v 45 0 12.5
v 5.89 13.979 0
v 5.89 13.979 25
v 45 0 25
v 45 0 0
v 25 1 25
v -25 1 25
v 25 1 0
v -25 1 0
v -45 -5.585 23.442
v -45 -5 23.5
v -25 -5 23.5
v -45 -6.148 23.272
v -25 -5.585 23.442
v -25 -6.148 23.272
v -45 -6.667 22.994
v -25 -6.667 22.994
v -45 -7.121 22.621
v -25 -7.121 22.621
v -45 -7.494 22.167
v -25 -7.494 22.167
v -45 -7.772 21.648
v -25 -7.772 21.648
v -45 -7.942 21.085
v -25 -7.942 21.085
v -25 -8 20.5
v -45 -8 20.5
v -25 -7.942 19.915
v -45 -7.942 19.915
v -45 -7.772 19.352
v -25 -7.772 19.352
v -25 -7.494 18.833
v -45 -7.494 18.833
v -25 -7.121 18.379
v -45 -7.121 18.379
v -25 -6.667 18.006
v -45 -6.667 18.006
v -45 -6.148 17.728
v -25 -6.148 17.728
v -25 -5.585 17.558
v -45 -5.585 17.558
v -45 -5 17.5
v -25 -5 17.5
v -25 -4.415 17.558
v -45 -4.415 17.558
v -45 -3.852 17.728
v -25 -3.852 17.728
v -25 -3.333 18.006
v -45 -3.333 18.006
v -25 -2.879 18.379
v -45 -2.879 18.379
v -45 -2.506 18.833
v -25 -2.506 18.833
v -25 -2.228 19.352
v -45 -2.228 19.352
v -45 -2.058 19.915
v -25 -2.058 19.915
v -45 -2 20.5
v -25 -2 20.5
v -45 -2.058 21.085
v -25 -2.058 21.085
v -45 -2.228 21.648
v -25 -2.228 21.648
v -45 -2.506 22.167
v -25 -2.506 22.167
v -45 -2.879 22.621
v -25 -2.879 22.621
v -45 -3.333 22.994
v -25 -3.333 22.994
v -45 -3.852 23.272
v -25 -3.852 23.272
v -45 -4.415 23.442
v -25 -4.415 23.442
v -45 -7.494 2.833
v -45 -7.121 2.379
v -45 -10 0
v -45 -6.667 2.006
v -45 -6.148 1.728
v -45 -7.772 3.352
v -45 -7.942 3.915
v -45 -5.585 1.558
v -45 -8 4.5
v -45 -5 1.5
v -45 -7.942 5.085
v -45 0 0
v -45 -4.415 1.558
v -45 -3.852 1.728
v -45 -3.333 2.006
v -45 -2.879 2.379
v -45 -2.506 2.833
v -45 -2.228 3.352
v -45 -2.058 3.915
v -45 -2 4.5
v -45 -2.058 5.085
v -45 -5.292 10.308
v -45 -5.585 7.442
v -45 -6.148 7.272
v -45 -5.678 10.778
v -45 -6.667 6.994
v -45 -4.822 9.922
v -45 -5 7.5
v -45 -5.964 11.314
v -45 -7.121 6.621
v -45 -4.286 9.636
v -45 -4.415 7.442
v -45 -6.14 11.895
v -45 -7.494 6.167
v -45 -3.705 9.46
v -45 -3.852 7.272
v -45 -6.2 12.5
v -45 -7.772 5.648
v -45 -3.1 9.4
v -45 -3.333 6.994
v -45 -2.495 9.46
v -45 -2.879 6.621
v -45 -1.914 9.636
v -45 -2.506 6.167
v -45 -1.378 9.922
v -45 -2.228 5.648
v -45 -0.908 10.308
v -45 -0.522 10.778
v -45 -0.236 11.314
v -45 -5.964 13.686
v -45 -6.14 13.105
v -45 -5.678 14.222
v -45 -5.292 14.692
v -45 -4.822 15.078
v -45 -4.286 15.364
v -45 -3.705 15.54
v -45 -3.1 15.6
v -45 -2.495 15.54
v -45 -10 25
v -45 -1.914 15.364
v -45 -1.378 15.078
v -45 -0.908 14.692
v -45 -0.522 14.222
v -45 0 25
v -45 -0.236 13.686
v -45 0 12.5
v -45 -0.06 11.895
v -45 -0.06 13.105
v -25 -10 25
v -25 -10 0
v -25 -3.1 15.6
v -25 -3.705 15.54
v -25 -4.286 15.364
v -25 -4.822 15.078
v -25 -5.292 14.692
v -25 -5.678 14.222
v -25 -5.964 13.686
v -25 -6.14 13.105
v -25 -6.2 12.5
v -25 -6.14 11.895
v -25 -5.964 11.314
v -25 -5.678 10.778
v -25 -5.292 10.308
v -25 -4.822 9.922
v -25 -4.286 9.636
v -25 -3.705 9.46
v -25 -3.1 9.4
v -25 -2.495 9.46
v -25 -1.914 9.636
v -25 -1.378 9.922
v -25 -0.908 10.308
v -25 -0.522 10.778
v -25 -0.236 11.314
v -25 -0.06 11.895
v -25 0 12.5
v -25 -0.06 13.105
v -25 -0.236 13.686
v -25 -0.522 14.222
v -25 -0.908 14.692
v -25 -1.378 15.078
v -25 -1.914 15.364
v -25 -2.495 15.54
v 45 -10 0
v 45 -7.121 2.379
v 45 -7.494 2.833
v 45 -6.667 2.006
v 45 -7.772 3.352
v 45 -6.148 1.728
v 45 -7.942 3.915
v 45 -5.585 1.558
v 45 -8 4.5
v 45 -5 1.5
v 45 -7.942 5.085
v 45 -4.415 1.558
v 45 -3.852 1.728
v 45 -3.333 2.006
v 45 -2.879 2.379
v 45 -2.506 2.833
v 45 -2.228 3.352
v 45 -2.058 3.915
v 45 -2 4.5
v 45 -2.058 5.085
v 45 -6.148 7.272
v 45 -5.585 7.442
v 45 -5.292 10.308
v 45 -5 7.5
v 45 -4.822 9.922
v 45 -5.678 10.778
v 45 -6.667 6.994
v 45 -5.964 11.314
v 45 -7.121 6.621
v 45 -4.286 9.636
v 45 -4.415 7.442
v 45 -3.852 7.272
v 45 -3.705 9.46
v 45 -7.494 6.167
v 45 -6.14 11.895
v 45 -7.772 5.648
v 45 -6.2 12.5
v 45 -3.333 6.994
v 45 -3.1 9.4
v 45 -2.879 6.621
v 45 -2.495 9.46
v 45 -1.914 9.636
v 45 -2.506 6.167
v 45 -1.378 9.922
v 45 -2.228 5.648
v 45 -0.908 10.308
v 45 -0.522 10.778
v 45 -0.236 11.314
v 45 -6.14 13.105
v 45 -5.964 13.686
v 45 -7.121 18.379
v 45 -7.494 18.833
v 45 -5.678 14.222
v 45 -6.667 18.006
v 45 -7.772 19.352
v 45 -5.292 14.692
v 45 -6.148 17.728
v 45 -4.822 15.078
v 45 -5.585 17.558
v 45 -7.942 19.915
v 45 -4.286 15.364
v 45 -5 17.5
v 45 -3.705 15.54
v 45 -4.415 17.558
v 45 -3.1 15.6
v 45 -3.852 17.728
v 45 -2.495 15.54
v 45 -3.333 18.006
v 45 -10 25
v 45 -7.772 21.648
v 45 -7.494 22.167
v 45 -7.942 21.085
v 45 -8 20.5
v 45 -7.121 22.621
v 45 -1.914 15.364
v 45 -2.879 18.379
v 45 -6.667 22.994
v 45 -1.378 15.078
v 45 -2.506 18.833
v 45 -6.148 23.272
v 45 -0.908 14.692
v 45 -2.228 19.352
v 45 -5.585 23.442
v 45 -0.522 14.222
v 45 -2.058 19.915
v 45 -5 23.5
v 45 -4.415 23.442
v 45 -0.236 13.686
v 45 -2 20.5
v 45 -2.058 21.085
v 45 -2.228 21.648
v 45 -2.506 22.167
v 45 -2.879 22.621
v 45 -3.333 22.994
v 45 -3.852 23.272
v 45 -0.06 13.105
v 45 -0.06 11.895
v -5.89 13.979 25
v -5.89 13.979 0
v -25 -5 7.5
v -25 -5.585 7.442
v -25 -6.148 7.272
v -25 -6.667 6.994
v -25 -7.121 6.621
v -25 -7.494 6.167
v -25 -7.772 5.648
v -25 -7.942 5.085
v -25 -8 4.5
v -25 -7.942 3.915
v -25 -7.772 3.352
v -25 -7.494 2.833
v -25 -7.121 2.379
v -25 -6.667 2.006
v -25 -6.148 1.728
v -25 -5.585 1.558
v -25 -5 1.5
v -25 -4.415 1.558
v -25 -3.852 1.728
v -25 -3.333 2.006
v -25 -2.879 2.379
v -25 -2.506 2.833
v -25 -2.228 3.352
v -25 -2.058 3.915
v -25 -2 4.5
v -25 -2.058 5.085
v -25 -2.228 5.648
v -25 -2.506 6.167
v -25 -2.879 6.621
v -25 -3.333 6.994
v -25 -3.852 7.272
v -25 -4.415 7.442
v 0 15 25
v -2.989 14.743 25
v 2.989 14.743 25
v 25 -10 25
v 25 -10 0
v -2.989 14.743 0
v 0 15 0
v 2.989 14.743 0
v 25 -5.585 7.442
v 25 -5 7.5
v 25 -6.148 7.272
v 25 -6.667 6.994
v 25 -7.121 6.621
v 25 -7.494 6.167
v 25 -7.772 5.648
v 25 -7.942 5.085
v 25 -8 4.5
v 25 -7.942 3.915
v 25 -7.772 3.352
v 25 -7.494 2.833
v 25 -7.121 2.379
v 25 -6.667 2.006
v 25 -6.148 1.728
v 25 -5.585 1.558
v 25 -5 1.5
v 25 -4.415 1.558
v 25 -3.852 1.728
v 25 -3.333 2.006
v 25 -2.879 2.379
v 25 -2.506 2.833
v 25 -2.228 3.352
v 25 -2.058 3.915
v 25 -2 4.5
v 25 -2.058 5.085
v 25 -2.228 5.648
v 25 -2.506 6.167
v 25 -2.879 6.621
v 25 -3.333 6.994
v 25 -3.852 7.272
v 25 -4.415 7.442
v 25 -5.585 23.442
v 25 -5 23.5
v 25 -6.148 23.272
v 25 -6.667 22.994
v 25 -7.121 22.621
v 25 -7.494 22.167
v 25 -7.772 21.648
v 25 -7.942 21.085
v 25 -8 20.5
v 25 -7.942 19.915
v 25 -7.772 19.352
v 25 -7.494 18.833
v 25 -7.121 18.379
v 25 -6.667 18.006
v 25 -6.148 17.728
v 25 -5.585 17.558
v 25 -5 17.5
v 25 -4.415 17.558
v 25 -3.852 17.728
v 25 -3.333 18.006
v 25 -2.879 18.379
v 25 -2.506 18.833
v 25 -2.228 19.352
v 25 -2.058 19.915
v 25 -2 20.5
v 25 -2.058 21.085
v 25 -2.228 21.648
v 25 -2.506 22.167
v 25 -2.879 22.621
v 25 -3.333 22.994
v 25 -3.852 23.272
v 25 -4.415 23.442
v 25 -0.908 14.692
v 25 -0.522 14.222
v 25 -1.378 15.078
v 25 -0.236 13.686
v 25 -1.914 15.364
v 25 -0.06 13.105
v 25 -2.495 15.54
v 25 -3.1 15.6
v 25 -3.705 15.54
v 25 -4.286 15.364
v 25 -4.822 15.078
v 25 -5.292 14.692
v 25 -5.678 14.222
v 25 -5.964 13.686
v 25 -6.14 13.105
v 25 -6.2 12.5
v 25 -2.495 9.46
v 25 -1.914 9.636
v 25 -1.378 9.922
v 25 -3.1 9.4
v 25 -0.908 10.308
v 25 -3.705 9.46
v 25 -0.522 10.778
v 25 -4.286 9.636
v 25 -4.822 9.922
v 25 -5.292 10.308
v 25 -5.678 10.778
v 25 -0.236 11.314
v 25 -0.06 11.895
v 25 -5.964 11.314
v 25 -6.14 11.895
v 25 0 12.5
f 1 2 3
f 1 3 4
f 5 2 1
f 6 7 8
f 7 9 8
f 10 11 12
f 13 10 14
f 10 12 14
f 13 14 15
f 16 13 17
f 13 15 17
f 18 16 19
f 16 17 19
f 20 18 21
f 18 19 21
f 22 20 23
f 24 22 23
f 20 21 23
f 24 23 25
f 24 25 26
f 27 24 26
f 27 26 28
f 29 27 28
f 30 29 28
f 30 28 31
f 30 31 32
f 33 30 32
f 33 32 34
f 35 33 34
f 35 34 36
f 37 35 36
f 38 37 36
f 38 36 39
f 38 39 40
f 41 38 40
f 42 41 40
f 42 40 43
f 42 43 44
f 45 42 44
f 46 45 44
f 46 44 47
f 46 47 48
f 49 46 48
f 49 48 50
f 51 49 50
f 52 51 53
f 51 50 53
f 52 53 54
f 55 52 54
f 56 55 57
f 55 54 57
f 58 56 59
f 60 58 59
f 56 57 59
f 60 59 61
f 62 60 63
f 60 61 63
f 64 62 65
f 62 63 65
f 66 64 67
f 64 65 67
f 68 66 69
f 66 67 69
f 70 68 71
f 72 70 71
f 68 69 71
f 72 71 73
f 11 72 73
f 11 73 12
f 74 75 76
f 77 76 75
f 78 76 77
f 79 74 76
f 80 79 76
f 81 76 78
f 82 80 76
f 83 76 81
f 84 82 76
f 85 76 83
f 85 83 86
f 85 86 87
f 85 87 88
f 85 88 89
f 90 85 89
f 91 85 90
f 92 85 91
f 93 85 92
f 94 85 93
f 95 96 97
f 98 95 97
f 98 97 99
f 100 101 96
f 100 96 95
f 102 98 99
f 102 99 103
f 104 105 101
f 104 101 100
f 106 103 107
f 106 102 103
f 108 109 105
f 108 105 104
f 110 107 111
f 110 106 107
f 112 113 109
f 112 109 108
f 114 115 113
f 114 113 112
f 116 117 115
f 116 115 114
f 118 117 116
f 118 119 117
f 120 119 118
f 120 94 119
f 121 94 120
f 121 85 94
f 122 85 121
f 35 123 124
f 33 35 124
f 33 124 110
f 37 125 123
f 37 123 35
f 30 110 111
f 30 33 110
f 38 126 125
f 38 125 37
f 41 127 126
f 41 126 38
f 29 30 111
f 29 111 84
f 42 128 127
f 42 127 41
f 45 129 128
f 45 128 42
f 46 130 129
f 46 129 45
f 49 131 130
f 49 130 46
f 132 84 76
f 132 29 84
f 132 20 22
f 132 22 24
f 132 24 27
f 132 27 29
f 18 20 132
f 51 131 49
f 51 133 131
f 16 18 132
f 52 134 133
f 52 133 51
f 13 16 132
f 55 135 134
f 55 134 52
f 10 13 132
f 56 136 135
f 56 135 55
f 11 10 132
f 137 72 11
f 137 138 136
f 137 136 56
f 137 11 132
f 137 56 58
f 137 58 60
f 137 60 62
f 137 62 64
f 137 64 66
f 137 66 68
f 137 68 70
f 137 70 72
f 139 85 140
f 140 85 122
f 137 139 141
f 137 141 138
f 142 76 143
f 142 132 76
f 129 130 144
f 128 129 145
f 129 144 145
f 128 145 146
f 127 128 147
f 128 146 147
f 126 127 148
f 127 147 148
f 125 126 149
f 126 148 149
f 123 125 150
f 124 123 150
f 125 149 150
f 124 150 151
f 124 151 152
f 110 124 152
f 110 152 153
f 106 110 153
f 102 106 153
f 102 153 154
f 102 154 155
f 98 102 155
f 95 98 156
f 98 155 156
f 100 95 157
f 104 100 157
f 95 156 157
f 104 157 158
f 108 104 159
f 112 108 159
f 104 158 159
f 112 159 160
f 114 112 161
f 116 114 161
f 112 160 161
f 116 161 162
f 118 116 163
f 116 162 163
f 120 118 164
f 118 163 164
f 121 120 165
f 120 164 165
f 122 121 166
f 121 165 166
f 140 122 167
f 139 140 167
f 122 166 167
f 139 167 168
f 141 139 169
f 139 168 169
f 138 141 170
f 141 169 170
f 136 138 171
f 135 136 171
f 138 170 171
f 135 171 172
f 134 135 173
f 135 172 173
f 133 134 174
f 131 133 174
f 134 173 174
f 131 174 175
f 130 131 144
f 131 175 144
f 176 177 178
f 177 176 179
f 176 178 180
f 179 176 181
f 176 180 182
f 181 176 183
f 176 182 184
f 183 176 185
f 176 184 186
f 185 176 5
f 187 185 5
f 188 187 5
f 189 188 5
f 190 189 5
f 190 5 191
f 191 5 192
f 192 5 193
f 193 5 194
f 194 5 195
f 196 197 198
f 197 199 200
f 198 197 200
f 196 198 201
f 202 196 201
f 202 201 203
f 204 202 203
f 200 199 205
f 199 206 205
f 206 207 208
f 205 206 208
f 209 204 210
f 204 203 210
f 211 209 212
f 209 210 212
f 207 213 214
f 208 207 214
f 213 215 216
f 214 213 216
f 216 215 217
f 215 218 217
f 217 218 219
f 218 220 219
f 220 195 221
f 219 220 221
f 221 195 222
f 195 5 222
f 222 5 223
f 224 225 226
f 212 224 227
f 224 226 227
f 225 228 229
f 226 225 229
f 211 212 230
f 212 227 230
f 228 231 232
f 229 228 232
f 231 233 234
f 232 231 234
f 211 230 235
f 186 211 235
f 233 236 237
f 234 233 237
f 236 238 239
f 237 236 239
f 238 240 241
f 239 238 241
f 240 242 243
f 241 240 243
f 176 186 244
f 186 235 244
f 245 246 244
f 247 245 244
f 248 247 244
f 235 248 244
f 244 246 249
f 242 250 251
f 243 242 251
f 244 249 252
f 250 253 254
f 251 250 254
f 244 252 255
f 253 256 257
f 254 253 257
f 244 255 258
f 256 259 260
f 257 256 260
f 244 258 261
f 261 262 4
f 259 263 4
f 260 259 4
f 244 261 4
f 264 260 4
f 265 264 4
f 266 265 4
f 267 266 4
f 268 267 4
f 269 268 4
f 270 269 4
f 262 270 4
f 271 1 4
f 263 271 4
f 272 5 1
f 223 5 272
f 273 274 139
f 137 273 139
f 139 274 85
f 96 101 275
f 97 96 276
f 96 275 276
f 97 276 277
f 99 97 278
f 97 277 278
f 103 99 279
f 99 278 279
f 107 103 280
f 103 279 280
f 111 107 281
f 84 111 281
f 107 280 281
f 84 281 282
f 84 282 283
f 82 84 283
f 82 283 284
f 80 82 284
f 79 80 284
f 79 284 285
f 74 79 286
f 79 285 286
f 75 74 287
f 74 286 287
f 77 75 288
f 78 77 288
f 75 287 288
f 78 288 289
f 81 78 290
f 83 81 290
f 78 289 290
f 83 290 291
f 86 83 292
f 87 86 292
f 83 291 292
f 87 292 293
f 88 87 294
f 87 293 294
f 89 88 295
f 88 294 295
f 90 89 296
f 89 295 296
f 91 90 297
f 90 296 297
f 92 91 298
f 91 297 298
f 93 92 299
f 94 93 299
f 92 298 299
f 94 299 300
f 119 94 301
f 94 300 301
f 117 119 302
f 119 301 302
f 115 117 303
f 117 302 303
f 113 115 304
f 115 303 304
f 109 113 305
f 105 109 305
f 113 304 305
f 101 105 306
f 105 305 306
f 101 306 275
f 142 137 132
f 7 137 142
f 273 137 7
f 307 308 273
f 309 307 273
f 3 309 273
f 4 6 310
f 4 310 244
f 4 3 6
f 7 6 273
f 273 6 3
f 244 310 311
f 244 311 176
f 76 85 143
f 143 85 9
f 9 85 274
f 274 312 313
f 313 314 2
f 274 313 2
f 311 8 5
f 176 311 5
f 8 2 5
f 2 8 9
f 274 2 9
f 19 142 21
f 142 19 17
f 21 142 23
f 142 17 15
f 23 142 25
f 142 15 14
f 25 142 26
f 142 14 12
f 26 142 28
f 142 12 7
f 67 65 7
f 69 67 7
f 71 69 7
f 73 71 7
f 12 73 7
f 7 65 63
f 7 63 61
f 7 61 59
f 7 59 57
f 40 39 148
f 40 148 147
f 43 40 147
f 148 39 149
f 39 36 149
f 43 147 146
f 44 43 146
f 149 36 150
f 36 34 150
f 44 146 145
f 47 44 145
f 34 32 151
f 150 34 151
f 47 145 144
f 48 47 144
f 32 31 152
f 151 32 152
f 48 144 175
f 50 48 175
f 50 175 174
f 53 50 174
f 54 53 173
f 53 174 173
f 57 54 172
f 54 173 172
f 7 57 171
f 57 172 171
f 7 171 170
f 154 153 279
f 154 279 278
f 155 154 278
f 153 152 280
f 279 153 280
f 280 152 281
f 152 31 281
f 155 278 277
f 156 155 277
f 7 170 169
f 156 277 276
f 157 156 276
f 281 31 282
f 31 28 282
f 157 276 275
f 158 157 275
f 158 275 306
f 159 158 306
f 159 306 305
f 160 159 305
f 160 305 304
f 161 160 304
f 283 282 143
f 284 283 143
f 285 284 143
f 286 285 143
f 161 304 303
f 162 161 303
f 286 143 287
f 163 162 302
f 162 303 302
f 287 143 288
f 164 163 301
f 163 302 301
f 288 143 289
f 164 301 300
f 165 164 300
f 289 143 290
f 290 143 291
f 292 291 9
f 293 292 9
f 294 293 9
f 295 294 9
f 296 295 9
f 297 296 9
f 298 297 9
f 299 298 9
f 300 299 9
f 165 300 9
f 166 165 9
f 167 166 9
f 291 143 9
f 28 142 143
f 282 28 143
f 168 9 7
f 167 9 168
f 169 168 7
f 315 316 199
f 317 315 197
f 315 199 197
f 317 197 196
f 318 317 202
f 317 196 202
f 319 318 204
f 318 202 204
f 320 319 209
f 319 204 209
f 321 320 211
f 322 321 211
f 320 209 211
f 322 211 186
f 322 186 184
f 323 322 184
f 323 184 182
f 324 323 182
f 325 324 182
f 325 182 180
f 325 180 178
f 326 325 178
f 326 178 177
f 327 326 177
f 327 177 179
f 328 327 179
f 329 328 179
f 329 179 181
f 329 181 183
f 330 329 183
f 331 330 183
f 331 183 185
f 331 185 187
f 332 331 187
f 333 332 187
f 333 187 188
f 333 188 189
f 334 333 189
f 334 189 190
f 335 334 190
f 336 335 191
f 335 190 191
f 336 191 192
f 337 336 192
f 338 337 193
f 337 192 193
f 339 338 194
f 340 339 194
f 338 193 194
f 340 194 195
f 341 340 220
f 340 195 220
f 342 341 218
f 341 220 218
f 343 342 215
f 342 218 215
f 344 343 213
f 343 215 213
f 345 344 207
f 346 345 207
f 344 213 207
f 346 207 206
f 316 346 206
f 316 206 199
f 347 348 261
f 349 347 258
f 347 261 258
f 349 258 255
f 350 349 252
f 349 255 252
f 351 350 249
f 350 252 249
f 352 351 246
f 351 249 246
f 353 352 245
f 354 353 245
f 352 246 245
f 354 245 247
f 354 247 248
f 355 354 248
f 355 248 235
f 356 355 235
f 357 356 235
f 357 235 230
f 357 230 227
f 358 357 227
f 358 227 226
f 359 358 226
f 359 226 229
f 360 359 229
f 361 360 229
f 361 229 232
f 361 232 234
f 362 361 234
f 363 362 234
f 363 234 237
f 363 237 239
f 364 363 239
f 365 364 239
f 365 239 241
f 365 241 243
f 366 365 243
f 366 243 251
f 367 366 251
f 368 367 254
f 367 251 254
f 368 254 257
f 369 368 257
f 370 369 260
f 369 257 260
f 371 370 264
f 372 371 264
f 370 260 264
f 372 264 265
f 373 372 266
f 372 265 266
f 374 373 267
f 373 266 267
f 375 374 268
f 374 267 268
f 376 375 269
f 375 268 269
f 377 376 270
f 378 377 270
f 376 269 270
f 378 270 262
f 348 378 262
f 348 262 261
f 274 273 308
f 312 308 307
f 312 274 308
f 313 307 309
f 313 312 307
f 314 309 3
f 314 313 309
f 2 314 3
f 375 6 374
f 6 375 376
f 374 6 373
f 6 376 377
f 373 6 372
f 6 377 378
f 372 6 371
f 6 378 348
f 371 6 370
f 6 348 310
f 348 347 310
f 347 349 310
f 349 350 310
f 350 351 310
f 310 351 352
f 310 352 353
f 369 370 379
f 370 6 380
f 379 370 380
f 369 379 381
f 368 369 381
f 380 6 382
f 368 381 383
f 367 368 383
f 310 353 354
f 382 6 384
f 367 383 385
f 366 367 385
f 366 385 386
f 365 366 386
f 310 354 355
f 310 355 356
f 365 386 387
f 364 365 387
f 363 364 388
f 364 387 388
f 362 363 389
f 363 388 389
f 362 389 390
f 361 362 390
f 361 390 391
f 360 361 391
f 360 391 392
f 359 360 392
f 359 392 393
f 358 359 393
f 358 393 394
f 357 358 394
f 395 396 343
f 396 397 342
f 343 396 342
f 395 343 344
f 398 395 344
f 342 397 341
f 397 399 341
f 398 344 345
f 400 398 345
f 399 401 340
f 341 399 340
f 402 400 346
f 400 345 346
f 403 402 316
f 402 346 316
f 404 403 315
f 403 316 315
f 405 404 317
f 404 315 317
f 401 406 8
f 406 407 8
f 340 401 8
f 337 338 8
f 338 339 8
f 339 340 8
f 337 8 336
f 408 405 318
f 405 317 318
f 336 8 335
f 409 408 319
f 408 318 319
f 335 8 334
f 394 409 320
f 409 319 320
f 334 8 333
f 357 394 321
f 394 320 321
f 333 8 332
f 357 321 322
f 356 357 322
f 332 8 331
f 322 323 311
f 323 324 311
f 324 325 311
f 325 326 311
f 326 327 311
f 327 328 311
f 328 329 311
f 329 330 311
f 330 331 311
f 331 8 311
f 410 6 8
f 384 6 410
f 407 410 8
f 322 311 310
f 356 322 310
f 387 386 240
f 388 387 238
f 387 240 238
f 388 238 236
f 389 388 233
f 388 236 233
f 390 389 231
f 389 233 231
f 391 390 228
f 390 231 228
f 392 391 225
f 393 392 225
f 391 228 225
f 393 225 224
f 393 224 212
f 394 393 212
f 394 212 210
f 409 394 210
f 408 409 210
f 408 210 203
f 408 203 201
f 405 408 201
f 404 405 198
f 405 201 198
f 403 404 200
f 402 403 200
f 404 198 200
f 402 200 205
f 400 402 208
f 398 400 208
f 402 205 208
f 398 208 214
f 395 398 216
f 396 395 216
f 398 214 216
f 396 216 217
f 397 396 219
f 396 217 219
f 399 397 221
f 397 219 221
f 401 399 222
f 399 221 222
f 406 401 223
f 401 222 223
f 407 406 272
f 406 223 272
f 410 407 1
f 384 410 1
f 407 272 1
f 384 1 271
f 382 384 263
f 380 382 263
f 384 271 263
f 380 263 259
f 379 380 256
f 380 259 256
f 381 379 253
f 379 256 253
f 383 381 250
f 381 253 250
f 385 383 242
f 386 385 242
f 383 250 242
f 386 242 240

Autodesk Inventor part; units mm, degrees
ref_plane "YZ Plane" through (0, 0, 0) normal (1, 0, 0) x (0, 1, 0)
ref_plane "XZ Plane" through (0, 0, 0) normal (0, 1, 0) x (-1, 0, 0)
ref_plane "XY Plane" through (0, 0, 0) normal (0, 0, 1) x (1, 0, 0)
sketch "Skizze1" plane through (0, 0, 0) normal (0, 0, 1) x (1, 0, 0)
  line L0 (-63, 0) -> (63, 0) projected
  line L1 (0, -6) -> (0, 18.5) projected
  arc A0 (5.8901, 13.979) -> (-5.8901, 13.979) centre (0, -2.5) ccw
  line L2 (-5.8901, 13.979) -> (-45, 0)
  line L3 (5.8901, 13.979) -> (45, 0)
  line L4 (-45, 0) -> (45, 0)
  dimension "d2" = 35
  dimension "d3" = 15
  dimension "d4" = 45
extrude "Extrusion1" add sketch "Skizze1" along normal blind 25
sketch "Skizze4" plane through (-45, 0, 0) normal (0, -1, 0) x (1, 0, 0)
  line L0 (0, 25) -> (90, 25) projected
  line L1 (0, 0) -> (0, 25) projected
  line L2 (90, 25) -> (0, 25)
  line L3 (0, 25) -> (0, 0)
  line L4 (0, 0) -> (90, 0)
  line L5 (90, 0) -> (90, 25)
  point P0 (45, 0)
extrude "Extrusion4" add sketch "Skizze4" along normal blind 10
sketch "Skizze5" plane through (-45, -10, 0) normal (-1, 0, 0) x (0, 0, 1)
  line L0 (25, 0) -> (0, 0) projected
  line L1 (0, 10) -> (0, 0) projected
  point P0 (4.5, 5)
  point P1 (20.5, 5)
  dimension "d17" = 5
  dimension "d18" = 5
  dimension "d19" = 25
  dimension "d20" = 16
  dimension "d21" = 4.5
hole "Bohrung1" at (-45, -5, 4.5) at (-45, -5, 20.5) direction (1, 0, 0) diameter 6 end through all
sketch "Skizze6" plane through (-45, -10, 0) normal (-1, 0, 0) x (0, 0, 1)
  line L0 (0, 10) -> (25, 10) projected
  line L1 (0, 23.979) -> (0, 10) projected
  point P0 (12.5, 6.9)
  dimension "d29" = 3.1
  dimension "d30" = 12.5
hole "Bohrung2" at (-45, -3.1, 12.5) direction (1, 0, 0) diameter 6.2 end through all
sketch "Skizze7" plane through (0, 0, 0) normal (0, 0, -1) x (-1, 0, 0)
  line L0 (0, -15) -> (0, 20) projected
  line L1 (45, -10) -> (-45, -10) projected
  line L2 (-25, -10) -> (25, -10)
  line L3 (25, -10) -> (25, 1)
  line L4 (25, 1) -> (-25, 1)
  line L5 (-25, 1) -> (-25, -10)
  point P0 (0, 0)
  dimension "d38" = 50
  dimension "d39" = 11
extrude "Extrusion5" cut sketch "Skizze7" against normal blind 25
properties part number "Schieber"
